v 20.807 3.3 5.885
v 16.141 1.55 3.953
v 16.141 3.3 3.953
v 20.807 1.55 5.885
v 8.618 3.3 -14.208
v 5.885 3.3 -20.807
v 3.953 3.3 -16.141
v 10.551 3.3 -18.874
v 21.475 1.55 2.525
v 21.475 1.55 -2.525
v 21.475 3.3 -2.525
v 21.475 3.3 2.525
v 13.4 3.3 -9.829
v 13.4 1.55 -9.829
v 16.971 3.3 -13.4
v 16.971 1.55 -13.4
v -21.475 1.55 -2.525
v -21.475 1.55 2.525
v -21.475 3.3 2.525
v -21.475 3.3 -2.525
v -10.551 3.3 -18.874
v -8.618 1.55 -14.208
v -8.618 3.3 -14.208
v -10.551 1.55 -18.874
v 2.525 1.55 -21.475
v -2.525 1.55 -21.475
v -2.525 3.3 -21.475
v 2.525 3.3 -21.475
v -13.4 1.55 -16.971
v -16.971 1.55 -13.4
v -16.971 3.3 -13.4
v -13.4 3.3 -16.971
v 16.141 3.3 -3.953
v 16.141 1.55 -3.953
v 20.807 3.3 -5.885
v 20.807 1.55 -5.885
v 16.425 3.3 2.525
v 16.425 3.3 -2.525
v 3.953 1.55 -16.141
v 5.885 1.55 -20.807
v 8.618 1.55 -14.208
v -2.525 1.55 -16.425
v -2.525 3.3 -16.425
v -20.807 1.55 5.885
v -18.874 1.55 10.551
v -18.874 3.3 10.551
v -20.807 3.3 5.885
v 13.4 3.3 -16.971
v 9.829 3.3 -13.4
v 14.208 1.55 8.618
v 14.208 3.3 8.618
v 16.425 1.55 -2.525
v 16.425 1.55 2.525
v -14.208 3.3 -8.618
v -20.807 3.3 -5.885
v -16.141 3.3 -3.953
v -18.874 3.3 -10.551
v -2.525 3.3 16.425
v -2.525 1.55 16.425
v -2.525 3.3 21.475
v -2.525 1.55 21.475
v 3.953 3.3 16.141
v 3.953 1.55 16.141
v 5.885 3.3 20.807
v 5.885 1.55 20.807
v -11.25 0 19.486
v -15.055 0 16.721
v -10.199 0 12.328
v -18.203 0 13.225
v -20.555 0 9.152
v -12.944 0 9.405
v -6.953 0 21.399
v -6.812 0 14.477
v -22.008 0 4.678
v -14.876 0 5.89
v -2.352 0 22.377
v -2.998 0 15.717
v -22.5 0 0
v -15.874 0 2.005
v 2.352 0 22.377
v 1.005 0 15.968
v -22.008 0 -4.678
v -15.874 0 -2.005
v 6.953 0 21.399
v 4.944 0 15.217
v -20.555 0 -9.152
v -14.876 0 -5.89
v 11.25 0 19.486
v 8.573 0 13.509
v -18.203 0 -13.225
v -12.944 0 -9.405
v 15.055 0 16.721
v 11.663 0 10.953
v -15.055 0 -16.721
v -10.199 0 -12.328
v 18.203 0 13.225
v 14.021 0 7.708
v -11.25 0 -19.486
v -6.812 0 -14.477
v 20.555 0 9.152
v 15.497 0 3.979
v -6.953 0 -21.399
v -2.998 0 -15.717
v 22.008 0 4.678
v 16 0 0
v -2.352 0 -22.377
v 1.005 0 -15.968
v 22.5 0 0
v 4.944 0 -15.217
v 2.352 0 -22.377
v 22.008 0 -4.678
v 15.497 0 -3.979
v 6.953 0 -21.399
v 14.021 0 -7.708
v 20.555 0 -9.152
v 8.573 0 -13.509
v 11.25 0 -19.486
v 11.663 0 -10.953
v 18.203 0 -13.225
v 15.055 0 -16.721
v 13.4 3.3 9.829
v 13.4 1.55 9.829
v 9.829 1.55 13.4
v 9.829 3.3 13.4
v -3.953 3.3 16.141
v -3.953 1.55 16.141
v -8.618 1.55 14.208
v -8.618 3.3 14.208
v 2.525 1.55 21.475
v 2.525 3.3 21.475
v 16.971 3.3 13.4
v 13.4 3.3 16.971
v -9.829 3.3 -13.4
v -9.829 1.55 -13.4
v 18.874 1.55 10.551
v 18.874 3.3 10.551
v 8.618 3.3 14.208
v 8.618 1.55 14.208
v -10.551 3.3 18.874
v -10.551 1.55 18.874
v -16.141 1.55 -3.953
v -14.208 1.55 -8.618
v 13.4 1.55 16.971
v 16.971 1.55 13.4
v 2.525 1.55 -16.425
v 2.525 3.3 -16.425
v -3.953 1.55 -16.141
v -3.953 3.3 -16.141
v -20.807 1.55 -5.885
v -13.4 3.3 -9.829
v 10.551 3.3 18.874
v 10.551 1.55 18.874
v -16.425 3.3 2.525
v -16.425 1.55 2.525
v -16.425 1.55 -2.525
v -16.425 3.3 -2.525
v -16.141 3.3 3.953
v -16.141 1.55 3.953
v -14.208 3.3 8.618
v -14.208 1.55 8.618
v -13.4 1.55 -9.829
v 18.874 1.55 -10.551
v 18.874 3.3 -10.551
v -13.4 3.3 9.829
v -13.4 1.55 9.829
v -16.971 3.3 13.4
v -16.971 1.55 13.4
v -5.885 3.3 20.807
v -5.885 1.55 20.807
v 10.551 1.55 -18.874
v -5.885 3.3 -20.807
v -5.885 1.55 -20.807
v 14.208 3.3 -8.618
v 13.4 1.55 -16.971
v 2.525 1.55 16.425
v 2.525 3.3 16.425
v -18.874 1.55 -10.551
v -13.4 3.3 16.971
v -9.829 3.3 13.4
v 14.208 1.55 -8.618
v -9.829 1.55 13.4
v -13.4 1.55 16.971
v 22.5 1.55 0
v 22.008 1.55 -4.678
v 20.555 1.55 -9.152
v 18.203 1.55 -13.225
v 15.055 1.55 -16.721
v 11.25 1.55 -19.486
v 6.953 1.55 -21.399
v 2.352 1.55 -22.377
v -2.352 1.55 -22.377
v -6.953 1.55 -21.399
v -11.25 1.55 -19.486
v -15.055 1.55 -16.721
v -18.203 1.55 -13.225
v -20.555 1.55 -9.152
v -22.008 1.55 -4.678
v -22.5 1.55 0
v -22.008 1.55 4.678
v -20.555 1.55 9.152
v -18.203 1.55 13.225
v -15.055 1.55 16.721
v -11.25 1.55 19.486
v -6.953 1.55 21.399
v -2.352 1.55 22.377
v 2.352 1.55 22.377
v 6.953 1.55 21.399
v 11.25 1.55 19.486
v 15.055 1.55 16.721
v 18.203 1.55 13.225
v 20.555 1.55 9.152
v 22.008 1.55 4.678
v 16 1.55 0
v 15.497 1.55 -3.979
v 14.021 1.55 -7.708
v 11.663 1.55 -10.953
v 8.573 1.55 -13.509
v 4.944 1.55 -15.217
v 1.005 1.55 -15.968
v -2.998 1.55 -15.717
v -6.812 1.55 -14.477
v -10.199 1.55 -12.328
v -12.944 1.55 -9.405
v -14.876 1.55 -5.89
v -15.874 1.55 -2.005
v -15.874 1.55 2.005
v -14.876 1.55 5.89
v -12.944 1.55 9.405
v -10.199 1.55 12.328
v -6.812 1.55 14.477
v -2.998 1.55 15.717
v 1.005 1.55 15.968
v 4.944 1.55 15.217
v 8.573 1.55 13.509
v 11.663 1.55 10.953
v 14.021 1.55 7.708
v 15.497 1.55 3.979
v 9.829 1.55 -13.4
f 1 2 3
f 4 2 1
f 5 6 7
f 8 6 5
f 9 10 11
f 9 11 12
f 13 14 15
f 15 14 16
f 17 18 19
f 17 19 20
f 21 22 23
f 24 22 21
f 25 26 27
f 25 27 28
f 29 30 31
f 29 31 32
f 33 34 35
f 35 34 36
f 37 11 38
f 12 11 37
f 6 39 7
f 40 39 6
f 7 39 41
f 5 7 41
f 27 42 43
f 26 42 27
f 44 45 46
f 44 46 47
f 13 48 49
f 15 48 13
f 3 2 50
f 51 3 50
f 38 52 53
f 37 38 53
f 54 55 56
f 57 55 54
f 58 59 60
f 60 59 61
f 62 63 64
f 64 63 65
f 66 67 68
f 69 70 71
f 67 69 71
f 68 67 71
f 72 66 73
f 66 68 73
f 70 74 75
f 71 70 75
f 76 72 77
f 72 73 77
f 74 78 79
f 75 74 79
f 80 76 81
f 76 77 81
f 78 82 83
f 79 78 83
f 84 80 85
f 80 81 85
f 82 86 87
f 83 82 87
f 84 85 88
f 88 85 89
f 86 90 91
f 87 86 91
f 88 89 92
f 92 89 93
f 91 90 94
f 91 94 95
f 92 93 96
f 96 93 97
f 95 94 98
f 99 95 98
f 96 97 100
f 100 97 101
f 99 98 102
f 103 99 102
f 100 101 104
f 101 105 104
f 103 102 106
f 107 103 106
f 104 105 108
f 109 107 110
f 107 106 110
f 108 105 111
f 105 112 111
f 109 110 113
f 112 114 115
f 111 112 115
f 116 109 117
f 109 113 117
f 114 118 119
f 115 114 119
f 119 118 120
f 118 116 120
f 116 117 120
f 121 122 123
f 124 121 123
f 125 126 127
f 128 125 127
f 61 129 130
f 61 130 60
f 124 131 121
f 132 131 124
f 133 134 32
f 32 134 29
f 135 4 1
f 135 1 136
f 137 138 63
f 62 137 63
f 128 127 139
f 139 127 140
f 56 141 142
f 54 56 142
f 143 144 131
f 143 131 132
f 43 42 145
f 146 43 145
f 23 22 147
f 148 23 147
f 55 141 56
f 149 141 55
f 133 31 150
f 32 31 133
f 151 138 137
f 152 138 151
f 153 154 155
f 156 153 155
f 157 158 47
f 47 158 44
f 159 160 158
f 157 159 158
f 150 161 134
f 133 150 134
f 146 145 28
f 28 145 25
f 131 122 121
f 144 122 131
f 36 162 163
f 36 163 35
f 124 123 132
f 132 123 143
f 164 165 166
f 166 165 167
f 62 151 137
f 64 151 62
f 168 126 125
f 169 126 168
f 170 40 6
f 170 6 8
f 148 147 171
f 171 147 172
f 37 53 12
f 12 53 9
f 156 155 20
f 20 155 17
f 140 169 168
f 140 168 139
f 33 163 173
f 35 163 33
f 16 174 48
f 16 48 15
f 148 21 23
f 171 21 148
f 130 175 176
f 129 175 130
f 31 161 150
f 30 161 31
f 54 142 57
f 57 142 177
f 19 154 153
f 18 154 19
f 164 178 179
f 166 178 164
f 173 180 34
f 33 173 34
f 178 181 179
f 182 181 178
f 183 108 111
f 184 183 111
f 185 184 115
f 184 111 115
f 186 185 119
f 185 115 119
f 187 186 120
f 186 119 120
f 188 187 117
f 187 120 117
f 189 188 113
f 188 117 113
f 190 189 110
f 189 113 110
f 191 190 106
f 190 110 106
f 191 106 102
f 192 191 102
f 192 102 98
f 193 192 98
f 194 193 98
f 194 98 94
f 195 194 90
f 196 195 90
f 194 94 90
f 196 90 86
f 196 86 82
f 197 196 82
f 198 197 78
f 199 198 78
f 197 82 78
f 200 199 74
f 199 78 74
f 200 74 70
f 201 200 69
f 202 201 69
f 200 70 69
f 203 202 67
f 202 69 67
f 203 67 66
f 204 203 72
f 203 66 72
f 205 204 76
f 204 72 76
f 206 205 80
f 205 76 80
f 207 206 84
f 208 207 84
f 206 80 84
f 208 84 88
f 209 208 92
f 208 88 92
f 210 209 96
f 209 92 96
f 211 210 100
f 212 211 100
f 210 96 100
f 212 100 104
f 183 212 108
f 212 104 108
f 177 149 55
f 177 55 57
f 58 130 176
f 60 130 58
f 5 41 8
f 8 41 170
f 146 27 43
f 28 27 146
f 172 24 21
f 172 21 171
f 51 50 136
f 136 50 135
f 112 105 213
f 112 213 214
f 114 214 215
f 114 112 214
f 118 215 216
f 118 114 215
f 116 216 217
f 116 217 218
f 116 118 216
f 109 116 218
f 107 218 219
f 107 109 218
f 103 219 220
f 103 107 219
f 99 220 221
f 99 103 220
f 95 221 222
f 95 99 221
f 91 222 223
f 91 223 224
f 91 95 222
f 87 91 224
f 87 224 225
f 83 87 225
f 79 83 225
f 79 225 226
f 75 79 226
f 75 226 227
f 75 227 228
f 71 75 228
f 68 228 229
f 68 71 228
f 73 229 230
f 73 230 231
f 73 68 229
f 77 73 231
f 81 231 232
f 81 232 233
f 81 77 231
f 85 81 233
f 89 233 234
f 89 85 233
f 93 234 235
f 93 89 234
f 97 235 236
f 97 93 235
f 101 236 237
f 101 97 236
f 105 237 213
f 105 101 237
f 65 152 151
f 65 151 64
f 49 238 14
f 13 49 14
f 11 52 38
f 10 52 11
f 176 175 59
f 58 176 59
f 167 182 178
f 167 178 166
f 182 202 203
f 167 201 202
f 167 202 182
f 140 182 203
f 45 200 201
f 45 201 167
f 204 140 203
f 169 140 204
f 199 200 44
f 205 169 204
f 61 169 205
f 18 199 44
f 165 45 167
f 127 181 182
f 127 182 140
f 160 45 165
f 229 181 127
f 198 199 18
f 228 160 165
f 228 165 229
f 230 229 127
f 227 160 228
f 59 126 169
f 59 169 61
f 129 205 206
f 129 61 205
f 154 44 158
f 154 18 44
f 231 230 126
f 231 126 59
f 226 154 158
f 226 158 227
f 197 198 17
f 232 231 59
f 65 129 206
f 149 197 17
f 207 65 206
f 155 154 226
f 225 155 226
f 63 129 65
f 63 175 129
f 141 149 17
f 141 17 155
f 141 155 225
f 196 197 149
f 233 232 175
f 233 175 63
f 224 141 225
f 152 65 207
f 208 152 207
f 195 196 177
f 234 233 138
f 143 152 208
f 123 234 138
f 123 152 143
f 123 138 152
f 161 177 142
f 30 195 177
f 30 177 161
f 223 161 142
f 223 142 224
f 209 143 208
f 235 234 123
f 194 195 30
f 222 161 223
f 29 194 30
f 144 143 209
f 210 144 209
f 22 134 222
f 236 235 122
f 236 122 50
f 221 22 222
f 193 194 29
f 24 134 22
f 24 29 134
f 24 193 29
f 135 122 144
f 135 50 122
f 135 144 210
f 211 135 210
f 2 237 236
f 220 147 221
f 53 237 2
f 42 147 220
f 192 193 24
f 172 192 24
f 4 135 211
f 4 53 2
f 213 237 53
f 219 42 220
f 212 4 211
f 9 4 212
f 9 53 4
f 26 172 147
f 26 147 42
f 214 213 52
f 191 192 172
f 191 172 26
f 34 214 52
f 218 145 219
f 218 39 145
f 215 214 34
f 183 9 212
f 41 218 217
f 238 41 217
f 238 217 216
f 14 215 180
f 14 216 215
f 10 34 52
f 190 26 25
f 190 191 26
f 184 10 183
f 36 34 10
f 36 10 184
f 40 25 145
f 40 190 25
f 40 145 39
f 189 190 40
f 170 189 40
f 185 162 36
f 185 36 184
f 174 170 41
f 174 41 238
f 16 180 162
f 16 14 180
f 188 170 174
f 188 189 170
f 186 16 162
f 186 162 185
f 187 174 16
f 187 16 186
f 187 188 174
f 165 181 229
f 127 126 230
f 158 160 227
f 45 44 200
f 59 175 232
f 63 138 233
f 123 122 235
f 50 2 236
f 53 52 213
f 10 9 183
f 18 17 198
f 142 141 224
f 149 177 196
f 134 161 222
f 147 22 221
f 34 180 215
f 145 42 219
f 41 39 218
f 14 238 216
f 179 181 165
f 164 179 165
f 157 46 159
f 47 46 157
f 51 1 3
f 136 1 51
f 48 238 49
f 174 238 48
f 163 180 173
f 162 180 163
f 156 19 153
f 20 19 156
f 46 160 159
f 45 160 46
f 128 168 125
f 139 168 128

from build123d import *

# Parameters (mm, degrees)
SKETCH1_R           = 22.5
SKETCH1_R_2         = 16
BOSS_EXTRUDE1_DEPTH = 1.55
SKETCH2_W           = 5.05
SKETCH2_H           = 5.05
BOSS_EXTRUDE2_DEPTH = 1.75
CIRPATTERN1_COUNT   = 16


with BuildPart() as part:
    # Sketch1 → Boss-Extrude1 (new body)
    with BuildSketch(Plane(origin=(0, 0, 0), x_dir=(1, 0, 0), z_dir=(0, 1, 0))):
        Circle(SKETCH1_R)
        Circle(SKETCH1_R_2, mode=Mode.SUBTRACT)
    extrude(amount=BOSS_EXTRUDE1_DEPTH)

    # Sketch2 → Boss-Extrude2 (add)
    with BuildSketch(Plane(origin=(0, 1.55, 0), x_dir=(1, 0, 0), z_dir=(0, 1, 0))):
        with Locations((0, 18.95)):
            Rectangle(SKETCH2_W, SKETCH2_H)
    boss_extrude2 = extrude(amount=BOSS_EXTRUDE2_DEPTH)

    # CirPattern1: Boss-Extrude2 ×16 about axis
    cirpattern1_axis = Axis((0, 0, 0), (0, 1, 0))
    for i in range(1, CIRPATTERN1_COUNT):
        add(boss_extrude2.rotate(cirpattern1_axis, i * 360 / CIRPATTERN1_COUNT))


solid = part.part
